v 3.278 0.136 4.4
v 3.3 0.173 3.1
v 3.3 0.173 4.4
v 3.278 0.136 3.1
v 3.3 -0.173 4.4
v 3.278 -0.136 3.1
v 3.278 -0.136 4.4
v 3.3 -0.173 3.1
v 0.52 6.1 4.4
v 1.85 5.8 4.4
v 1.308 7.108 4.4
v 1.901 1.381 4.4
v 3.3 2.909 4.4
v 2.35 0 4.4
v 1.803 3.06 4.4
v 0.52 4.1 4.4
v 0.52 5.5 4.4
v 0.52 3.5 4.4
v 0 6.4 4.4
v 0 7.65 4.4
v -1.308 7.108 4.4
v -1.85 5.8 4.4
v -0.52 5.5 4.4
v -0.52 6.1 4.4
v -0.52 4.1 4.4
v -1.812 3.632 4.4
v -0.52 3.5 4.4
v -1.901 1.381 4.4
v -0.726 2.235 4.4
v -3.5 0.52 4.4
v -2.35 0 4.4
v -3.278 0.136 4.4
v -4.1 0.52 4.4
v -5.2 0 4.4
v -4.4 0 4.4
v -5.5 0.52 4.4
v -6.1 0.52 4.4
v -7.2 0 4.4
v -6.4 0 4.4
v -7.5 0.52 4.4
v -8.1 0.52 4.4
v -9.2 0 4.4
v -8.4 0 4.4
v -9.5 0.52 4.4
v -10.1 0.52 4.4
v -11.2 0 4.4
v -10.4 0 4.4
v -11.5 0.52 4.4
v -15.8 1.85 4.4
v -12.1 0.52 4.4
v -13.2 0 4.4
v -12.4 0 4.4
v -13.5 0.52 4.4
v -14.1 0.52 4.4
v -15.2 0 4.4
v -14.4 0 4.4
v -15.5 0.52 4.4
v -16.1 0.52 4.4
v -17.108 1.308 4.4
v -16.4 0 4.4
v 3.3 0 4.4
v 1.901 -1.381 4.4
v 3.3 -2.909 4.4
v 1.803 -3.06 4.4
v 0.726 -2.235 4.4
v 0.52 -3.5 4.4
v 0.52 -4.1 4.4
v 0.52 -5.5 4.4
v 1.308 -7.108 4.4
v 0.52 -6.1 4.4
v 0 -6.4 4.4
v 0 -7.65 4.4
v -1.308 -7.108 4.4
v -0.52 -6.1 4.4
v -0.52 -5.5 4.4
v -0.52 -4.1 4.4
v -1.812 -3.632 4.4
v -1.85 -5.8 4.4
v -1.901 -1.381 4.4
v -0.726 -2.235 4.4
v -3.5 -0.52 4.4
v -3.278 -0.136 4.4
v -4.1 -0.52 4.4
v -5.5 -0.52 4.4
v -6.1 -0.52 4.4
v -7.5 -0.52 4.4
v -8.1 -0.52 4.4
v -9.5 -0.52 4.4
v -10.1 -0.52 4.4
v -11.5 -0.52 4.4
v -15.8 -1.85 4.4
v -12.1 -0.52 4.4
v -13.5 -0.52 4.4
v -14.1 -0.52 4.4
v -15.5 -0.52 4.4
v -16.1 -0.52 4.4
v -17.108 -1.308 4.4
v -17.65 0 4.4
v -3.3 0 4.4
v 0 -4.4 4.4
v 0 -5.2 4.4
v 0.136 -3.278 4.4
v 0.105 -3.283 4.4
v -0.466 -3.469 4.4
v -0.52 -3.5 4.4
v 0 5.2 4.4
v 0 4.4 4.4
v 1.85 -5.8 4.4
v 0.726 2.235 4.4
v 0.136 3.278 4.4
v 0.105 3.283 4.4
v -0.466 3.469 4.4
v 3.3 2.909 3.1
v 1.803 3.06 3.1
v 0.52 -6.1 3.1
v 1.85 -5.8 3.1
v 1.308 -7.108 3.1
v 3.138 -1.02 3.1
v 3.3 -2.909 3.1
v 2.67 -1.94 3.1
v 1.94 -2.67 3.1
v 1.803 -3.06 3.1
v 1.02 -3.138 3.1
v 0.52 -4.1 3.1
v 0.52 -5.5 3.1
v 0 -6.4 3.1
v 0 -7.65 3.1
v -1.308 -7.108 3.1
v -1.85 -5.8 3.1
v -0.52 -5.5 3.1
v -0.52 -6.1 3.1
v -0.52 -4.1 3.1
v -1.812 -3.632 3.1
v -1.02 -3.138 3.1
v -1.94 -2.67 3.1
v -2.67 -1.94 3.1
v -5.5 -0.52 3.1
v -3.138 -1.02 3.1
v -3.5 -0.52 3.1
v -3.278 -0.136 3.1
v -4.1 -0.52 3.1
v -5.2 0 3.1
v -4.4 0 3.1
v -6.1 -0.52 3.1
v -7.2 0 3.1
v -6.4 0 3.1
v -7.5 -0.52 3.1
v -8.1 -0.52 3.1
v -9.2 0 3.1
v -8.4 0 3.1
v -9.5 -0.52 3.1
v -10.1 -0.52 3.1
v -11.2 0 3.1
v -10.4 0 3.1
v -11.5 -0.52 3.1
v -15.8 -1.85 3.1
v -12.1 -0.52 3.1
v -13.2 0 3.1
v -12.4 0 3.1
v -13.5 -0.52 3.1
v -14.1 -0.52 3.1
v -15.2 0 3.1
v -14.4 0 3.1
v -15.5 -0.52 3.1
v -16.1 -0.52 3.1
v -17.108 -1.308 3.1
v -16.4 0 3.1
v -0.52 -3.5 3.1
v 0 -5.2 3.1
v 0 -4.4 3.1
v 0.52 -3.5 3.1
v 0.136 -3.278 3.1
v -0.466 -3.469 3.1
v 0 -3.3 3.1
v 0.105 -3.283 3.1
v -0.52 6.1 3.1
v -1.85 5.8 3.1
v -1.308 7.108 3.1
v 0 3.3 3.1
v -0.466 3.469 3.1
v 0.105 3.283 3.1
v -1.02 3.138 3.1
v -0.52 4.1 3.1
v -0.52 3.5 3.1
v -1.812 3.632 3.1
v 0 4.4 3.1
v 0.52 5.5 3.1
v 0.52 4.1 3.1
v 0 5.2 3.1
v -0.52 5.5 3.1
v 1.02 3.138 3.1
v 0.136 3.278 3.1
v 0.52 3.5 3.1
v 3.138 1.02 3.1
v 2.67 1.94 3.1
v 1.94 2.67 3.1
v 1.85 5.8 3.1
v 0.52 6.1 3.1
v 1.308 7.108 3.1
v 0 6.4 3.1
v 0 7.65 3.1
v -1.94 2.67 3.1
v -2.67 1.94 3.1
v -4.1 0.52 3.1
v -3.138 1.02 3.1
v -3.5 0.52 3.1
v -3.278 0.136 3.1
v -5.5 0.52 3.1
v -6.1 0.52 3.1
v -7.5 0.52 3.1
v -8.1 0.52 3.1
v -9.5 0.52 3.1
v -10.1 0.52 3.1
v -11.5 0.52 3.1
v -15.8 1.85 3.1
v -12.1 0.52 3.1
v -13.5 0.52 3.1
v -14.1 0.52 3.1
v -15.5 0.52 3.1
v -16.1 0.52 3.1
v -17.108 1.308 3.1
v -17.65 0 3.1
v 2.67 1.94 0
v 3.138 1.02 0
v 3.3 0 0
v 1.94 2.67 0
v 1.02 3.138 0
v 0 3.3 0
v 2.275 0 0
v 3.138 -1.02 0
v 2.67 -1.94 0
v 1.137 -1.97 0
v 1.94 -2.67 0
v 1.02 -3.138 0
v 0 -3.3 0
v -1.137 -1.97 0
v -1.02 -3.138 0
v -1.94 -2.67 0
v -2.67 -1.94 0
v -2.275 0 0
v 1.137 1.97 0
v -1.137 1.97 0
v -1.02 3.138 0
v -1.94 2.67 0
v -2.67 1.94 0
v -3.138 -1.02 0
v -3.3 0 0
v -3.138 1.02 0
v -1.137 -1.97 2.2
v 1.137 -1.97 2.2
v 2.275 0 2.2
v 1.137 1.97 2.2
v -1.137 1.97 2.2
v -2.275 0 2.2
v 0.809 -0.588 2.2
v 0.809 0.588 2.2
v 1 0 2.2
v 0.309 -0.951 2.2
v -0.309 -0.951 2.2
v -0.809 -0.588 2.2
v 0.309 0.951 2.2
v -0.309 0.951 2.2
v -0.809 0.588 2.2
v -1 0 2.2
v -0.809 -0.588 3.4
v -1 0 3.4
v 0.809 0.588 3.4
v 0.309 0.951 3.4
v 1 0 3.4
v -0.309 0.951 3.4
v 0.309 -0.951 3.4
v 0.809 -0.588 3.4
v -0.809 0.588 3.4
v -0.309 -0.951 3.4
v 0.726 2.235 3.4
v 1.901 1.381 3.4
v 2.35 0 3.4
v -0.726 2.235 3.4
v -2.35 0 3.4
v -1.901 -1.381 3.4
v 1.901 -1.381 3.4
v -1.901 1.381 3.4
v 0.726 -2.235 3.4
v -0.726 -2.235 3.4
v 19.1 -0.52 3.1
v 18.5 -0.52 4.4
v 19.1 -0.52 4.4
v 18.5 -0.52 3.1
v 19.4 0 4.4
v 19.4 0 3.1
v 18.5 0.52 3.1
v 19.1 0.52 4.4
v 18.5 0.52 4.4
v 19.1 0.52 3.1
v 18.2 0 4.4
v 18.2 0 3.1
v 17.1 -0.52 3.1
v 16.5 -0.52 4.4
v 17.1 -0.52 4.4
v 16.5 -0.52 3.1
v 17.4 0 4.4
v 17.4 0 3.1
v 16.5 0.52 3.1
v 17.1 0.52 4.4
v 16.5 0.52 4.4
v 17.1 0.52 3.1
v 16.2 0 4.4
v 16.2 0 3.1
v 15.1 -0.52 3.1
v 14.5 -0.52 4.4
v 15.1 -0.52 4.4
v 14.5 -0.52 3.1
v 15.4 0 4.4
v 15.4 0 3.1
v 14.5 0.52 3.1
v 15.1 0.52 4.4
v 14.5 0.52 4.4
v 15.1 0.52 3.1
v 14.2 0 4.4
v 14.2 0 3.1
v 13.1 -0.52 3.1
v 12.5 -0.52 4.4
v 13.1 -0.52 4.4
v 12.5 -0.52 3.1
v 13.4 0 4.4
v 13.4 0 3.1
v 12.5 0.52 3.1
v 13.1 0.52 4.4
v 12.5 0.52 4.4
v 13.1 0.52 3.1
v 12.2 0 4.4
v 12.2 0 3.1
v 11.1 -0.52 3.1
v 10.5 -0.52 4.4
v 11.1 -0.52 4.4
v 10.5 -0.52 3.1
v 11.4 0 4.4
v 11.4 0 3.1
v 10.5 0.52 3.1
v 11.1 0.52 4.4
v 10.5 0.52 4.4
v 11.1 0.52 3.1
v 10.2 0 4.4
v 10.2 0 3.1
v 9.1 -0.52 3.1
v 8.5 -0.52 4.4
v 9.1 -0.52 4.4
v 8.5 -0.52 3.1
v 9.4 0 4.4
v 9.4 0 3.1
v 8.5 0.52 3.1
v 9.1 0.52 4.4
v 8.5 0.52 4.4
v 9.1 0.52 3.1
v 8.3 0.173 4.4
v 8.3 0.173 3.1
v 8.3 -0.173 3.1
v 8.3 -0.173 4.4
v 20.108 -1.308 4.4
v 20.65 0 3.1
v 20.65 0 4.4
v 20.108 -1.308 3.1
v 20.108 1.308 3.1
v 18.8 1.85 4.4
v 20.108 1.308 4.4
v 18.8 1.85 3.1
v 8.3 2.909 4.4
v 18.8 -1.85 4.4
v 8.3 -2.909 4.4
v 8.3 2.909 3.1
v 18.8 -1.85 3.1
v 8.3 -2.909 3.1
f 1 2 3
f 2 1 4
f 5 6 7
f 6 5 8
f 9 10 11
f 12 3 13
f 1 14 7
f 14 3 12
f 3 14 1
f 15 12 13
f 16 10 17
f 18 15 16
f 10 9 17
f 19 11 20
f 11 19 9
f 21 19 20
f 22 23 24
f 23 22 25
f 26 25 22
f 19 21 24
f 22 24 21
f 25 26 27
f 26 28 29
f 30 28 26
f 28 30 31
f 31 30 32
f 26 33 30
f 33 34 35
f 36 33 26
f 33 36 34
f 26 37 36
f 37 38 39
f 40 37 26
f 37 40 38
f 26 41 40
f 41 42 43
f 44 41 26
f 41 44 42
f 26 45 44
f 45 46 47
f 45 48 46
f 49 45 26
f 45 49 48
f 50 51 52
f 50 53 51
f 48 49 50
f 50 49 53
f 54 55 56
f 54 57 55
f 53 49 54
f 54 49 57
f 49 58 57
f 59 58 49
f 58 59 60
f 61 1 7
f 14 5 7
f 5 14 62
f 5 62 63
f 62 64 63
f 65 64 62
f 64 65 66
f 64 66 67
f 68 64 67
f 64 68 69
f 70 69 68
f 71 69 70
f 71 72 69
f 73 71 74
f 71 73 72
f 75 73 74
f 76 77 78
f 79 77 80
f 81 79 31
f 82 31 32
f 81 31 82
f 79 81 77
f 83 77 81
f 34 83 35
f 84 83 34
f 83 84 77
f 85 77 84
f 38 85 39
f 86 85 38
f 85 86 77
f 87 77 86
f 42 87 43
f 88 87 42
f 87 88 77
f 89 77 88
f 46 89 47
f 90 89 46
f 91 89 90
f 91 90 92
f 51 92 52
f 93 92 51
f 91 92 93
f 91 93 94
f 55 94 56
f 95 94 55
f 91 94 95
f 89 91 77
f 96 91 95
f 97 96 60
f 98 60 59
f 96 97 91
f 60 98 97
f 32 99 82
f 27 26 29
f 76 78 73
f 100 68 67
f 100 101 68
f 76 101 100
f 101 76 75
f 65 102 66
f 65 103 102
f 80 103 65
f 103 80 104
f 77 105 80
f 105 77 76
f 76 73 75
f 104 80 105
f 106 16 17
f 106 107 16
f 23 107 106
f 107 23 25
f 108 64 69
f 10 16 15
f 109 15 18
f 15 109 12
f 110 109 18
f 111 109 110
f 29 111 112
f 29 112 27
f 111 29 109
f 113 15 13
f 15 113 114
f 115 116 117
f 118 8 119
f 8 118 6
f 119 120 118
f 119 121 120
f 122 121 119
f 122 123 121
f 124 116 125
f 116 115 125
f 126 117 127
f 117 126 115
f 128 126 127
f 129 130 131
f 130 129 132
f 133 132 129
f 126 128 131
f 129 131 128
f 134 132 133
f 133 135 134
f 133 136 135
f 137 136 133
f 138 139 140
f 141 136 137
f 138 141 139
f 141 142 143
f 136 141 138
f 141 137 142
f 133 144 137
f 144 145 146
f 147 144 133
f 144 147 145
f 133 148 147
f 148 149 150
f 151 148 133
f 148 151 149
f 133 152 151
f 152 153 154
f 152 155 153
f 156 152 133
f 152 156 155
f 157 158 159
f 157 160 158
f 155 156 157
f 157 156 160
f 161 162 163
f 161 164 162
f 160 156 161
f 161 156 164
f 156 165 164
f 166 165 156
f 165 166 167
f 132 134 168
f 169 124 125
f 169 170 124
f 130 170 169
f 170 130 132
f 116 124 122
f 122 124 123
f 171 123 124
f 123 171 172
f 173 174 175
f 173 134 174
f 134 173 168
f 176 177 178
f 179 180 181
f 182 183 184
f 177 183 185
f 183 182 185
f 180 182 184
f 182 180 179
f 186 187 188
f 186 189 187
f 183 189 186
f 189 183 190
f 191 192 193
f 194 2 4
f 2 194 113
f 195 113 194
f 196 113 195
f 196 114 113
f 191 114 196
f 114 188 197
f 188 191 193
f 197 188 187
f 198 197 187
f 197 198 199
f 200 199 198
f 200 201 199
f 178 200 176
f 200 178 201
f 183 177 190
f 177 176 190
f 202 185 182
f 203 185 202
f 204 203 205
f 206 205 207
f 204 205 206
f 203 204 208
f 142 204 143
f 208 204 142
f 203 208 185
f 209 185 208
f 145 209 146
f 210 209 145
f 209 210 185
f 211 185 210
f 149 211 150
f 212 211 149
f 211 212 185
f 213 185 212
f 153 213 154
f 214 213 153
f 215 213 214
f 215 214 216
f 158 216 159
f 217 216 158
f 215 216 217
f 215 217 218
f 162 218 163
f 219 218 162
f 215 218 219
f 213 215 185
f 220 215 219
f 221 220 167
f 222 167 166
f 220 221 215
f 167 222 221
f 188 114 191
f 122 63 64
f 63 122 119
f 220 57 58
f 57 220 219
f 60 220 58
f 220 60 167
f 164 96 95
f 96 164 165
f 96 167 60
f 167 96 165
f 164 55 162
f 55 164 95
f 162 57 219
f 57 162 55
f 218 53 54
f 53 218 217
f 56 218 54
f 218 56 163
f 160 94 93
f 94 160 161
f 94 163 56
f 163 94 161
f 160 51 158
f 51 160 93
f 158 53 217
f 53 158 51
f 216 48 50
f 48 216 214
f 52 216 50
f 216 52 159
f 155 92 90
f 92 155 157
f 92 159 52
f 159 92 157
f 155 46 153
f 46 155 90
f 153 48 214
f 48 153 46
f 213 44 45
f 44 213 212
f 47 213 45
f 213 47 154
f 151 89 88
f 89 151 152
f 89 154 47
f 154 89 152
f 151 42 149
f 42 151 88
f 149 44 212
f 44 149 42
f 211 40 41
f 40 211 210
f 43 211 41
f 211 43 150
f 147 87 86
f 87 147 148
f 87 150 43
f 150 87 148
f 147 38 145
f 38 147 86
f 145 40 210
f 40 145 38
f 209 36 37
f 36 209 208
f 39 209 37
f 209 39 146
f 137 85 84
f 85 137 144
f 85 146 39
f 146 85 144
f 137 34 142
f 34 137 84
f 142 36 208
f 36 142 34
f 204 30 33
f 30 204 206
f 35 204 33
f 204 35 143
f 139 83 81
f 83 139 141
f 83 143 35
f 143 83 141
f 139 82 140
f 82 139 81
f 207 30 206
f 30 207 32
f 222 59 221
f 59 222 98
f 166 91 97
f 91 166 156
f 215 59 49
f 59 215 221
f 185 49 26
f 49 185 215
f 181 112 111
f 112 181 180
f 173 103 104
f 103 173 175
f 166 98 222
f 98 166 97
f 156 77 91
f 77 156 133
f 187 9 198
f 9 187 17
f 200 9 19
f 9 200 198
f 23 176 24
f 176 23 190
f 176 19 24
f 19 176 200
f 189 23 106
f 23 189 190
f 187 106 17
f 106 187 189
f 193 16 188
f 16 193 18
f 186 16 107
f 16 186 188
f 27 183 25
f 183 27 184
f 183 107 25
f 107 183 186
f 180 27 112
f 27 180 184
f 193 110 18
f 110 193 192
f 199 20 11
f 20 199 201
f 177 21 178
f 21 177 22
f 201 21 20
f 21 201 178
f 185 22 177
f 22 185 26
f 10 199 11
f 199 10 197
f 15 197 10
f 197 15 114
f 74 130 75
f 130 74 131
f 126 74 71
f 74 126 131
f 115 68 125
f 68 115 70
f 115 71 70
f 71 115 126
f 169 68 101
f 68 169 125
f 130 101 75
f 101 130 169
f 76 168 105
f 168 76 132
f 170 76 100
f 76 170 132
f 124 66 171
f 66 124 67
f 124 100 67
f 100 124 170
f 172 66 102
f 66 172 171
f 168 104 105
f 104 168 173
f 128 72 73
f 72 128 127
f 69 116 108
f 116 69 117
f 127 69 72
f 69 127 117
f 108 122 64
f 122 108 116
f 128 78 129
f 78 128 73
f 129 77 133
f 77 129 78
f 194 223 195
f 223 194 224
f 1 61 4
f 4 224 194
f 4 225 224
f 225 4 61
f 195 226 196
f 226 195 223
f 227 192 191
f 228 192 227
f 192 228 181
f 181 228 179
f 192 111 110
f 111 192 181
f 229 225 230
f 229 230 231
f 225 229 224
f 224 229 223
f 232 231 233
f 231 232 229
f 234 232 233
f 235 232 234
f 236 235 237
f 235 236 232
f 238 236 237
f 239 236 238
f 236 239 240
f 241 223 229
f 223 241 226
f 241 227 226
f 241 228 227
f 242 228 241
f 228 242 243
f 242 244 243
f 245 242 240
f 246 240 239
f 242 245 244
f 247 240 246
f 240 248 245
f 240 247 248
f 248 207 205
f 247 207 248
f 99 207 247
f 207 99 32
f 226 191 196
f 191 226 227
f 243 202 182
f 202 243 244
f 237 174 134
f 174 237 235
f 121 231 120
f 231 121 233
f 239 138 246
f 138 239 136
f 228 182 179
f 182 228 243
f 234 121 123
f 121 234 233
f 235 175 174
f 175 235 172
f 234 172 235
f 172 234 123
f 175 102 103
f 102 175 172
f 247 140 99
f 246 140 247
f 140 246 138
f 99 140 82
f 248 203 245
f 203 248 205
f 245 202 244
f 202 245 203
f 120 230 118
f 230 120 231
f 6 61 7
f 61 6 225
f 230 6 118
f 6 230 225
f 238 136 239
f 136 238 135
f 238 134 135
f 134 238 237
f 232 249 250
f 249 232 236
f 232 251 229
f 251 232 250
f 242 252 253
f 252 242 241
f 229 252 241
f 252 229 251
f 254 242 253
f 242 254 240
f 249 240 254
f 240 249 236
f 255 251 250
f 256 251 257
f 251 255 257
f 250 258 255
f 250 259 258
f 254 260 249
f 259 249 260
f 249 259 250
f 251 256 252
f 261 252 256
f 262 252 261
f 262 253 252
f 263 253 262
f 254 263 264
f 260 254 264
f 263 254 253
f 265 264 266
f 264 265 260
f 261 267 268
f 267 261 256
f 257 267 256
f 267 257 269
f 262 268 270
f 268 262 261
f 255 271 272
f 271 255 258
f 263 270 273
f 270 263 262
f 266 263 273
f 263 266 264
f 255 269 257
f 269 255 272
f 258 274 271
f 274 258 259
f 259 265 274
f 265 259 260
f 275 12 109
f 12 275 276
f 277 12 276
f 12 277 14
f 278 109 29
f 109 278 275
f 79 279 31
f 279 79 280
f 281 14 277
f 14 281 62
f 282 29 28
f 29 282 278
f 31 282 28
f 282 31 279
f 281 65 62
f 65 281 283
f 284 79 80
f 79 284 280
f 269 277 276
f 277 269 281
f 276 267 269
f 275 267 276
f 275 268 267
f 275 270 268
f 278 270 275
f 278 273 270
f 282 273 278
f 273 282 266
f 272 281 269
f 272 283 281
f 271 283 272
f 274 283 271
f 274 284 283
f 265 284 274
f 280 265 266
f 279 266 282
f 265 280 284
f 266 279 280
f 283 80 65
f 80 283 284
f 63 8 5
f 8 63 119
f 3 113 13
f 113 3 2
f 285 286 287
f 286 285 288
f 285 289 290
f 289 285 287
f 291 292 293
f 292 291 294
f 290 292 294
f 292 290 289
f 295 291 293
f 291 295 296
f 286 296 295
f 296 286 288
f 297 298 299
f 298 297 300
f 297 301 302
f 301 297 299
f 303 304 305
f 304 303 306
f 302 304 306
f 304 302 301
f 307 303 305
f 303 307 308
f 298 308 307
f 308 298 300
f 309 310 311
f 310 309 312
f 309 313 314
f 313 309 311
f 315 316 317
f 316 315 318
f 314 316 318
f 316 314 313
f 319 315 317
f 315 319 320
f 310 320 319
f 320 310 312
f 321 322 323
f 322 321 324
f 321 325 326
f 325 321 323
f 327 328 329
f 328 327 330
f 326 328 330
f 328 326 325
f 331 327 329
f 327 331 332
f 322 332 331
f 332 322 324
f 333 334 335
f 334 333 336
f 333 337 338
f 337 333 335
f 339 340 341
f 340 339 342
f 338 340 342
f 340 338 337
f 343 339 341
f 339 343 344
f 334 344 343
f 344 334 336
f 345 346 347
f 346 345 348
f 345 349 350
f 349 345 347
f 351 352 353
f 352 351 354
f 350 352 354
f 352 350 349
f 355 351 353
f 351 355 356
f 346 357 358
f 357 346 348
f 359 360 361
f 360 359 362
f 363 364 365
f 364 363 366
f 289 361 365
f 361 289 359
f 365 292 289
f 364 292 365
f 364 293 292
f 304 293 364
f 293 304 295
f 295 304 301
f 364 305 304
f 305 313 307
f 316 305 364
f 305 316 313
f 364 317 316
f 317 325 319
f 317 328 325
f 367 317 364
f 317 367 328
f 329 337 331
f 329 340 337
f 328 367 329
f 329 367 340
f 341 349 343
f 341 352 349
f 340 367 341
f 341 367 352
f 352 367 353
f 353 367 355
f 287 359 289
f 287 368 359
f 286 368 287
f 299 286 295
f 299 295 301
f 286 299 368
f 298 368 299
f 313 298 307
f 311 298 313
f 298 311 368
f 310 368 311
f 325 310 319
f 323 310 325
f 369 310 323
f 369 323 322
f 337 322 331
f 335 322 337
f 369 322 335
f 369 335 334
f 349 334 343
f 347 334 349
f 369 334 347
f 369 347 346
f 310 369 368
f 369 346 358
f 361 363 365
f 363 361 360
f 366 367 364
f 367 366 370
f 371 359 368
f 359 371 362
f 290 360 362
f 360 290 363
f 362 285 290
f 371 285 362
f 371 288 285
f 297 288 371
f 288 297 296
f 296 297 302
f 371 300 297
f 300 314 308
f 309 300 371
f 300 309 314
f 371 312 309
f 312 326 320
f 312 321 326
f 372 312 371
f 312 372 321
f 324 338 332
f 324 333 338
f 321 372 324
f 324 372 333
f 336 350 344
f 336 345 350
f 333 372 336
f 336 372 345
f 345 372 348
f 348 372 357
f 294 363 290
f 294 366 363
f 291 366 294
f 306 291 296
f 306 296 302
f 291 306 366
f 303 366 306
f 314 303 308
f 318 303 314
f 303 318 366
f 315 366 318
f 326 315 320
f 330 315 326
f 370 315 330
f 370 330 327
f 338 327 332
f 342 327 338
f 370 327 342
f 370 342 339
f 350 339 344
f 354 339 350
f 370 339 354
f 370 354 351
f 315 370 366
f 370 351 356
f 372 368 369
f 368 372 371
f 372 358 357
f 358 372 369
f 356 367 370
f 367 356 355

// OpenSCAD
use <parts.scad>

difference() {
    SG90_cross_horn(0);
    translate([3.3, -10, -10]) color("Grey") cube([20, 20, 20]);
}

translate([5, 0, 0]) difference() {
    SG90_cross_horn(0);
    translate([3.3-30, -10, -10]) color("Grey") cube([30, 20, 20]);
}
